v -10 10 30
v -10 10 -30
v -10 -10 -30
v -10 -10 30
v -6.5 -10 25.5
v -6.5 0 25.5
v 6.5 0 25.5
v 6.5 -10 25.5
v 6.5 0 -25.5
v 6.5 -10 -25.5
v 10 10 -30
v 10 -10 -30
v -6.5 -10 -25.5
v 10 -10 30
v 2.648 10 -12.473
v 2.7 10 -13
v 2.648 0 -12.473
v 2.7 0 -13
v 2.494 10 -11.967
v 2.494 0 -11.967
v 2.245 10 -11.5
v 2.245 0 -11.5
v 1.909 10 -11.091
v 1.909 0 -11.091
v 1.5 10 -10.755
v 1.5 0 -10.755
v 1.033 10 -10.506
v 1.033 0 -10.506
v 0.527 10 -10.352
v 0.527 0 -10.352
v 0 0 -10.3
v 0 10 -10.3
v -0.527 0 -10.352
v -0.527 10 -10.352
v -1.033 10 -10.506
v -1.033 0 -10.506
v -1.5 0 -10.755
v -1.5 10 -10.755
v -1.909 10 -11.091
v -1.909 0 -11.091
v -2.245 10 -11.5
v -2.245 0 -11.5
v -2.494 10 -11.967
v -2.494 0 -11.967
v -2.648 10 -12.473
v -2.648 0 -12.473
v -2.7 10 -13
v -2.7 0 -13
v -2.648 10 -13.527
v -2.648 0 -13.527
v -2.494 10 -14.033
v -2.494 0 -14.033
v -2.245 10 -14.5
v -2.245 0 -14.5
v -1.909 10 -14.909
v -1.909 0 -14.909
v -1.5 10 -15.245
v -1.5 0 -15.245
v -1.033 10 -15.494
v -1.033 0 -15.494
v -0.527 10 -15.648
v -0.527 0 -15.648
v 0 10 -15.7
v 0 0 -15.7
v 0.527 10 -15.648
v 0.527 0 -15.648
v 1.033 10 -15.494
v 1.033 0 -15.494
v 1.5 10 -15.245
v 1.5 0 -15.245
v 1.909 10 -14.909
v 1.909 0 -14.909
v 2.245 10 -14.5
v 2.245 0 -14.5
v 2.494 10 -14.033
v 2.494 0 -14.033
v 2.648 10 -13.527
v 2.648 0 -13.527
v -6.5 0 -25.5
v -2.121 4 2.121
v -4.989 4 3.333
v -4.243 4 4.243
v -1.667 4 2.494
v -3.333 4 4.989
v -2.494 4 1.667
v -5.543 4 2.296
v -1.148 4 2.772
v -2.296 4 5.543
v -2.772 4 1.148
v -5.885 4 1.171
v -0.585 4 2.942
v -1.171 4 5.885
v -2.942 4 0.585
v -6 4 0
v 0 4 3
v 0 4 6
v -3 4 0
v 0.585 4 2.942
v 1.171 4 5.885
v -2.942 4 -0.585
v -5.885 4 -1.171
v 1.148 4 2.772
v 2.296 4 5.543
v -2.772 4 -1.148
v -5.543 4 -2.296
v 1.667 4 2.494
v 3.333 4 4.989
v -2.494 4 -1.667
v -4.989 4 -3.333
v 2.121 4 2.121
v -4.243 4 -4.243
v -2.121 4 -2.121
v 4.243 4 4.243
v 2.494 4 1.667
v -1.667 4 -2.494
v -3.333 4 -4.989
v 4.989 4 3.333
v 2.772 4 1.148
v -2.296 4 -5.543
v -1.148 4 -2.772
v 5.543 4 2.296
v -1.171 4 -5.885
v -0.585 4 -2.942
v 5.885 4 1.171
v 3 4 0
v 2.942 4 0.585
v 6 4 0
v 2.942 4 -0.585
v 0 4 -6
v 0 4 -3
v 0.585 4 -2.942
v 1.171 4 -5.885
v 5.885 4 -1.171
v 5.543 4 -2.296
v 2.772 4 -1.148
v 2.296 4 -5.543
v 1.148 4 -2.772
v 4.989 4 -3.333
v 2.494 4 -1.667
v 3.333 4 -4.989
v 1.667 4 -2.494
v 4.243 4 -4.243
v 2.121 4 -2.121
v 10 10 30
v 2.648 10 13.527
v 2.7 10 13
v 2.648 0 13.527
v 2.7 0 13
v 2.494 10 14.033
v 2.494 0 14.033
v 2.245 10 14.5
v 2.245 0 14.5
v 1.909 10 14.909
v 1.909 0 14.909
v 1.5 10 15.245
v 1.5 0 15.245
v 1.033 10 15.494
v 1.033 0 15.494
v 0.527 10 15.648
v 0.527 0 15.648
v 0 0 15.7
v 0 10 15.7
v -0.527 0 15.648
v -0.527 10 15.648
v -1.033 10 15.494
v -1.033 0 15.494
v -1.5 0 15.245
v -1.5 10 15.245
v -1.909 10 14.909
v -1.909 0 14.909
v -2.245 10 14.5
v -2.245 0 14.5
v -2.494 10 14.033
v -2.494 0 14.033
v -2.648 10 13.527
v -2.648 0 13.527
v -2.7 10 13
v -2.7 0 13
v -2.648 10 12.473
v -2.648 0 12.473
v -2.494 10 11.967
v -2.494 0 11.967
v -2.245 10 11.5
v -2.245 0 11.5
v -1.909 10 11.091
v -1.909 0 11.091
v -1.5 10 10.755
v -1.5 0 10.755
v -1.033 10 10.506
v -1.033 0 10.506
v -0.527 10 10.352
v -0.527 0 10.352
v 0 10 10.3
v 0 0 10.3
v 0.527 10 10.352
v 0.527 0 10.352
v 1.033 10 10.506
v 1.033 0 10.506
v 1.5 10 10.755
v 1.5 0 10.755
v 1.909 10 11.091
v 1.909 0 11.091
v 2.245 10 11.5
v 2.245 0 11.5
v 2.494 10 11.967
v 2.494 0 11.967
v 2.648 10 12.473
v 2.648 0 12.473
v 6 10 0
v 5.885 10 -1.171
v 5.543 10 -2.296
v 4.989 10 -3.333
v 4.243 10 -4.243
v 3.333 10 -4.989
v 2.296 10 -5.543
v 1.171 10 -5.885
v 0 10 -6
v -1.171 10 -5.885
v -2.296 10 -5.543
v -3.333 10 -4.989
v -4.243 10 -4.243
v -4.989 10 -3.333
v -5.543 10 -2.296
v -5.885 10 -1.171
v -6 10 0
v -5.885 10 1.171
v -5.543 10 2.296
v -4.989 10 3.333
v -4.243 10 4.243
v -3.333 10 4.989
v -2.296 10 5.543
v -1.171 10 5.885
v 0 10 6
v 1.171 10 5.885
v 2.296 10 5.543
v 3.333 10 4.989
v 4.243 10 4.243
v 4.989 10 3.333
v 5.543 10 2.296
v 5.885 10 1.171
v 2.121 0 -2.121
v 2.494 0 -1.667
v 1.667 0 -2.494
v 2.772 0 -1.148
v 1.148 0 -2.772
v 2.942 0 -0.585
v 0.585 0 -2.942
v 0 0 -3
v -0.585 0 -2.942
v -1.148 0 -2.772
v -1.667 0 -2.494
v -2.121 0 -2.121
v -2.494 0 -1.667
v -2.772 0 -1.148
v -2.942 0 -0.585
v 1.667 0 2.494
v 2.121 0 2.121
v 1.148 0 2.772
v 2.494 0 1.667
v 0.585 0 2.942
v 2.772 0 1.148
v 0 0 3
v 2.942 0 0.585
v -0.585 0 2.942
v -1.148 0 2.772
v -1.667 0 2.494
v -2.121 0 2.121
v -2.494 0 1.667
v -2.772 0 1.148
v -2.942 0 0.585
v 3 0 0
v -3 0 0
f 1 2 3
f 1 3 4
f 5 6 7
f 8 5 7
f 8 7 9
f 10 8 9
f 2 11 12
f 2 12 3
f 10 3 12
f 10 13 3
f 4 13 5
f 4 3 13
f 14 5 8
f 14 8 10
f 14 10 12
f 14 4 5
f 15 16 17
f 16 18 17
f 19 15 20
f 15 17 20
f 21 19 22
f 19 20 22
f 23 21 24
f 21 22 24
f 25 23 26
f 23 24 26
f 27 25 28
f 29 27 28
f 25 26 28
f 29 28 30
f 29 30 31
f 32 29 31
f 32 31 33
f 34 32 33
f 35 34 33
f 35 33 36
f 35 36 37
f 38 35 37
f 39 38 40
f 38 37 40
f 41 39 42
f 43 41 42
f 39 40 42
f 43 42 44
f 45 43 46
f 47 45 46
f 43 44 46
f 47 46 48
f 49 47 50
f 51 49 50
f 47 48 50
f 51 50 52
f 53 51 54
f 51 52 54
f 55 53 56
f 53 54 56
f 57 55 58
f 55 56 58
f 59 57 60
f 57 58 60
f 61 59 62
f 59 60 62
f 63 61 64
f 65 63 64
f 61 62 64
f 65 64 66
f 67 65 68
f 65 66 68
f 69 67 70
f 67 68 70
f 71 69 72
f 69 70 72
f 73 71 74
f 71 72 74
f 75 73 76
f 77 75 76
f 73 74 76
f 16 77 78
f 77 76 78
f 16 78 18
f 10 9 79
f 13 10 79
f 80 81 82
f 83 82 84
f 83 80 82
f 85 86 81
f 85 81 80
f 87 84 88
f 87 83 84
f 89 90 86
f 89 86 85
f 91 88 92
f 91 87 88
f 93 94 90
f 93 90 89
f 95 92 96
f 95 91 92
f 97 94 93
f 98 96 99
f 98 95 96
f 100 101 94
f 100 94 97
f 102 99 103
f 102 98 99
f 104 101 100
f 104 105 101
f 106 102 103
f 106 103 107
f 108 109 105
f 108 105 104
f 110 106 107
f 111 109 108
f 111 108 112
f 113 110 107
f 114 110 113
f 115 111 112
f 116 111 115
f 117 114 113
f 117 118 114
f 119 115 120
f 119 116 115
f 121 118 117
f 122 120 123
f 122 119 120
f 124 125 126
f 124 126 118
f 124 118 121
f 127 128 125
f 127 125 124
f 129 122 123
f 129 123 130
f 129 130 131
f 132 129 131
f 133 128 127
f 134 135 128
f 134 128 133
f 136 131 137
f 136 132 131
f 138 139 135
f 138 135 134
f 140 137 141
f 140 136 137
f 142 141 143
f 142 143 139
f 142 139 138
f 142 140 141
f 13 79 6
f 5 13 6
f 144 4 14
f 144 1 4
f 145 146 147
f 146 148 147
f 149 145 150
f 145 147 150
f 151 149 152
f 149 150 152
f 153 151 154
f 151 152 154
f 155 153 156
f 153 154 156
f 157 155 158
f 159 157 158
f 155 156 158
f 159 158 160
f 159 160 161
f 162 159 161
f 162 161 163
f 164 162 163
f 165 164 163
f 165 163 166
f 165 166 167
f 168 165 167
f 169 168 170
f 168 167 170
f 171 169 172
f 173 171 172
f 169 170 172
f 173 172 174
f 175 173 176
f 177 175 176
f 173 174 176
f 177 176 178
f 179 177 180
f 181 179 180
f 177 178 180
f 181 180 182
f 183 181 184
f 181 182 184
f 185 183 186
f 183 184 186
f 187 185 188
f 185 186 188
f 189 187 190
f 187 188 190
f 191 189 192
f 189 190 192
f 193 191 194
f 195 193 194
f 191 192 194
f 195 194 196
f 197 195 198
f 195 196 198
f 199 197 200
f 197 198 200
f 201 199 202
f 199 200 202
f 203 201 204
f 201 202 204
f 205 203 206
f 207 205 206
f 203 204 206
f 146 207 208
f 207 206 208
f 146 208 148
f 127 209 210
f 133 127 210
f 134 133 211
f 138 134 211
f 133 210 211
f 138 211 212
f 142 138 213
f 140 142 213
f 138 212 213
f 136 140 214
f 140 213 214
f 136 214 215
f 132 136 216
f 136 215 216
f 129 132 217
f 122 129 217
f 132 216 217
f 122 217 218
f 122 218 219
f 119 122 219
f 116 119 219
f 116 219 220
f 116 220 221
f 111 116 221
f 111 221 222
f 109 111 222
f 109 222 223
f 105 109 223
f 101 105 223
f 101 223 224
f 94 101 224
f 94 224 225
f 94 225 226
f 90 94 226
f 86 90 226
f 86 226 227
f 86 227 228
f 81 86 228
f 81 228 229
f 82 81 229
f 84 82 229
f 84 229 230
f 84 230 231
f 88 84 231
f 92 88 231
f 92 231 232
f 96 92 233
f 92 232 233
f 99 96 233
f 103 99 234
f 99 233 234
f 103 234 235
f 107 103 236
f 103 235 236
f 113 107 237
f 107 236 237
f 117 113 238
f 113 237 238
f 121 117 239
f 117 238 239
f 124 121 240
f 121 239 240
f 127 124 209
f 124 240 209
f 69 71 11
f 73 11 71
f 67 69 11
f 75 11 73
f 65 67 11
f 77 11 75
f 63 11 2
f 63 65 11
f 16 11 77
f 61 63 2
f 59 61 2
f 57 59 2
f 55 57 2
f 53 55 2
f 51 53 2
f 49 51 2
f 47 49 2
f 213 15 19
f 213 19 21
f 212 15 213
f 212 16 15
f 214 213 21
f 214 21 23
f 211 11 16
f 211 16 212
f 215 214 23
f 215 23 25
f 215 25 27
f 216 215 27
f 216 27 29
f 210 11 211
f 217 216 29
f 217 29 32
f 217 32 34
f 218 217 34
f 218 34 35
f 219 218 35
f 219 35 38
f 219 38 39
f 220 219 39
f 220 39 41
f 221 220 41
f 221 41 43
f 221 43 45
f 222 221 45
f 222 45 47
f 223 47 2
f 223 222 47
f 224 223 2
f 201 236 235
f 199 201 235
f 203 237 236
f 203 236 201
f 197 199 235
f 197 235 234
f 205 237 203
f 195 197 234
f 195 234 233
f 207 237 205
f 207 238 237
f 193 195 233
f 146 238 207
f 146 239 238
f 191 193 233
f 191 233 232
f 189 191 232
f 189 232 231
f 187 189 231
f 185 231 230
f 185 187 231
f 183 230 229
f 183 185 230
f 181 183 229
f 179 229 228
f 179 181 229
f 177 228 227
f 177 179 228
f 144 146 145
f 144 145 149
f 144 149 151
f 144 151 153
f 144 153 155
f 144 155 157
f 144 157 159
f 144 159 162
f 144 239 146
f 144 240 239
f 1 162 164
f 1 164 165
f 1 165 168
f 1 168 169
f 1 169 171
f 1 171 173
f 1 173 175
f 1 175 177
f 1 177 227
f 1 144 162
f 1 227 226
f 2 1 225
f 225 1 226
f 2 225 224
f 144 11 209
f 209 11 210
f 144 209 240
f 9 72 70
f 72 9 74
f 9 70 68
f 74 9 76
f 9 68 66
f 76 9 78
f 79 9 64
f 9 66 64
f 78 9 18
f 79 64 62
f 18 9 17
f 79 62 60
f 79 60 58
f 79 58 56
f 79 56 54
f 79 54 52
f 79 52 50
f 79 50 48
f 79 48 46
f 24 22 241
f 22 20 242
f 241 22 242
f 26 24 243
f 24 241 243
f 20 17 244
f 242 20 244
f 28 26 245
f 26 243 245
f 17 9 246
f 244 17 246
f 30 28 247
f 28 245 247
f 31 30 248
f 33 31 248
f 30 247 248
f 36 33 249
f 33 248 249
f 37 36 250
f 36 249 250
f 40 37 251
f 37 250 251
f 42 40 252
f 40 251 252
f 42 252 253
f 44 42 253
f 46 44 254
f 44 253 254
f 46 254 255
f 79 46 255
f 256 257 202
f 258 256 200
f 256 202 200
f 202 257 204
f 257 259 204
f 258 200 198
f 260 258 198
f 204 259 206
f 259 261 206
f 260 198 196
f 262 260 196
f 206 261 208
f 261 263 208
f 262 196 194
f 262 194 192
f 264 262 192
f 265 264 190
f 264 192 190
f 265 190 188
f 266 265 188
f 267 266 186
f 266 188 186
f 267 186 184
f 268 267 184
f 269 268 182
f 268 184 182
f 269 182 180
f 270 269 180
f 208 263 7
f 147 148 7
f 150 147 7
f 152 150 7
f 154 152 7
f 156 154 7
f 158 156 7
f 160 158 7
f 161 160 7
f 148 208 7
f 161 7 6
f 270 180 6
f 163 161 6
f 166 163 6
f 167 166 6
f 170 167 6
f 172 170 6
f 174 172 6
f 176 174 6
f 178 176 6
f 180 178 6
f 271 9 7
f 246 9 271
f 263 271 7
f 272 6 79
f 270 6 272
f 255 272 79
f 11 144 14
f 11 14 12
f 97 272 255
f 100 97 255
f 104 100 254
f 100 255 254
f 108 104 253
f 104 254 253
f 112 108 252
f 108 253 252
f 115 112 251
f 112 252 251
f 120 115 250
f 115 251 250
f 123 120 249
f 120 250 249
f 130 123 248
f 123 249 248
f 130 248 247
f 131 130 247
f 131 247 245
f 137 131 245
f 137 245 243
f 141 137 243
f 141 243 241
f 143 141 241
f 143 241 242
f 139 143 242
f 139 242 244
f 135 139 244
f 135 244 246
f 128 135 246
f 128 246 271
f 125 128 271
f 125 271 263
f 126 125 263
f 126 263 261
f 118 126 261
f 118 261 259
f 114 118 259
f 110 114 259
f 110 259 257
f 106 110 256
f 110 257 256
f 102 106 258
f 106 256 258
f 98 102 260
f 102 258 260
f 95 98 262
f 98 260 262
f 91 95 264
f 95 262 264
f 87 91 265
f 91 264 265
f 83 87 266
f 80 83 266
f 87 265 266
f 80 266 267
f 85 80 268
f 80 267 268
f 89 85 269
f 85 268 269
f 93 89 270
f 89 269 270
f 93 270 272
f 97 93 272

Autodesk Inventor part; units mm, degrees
ref_plane "YZ Plane" through (0, 0, 0) normal (1, 0, 0) x (0, 1, 0)
ref_plane "XZ Plane" through (0, 0, 0) normal (0, 1, 0) x (-1, 0, 0)
ref_plane "XY Plane" through (0, 0, 0) normal (0, 0, 1) x (1, 0, 0)
sketch "Boceto1" plane through (0, 0, 0) normal (0, 1, 0) x (-1, 0, 0)
  line L0 (-10, 30) -> (10, 30)
  line L1 (10, 30) -> (10, -30)
  line L2 (10, -30) -> (-10, -30)
  line L3 (-10, -30) -> (-10, 30)
  line L4 (-10, 30) -> (10, -30) construction
  line L5 (10, 30) -> (-10, -30) construction
  circle A0 centre (0, 0) radius 3
  dimension "d0" = 6
  dimension "d1" = 60
  dimension "d2" = 20
extrude "Extrusión1" add sketch "Boceto1" along normal blind 10
sketch "Boceto2" plane through (0, 0, 0) normal (0, -1, 0) x (1, 0, 0)
  circle A0 centre (0, 13) radius 2.7
  circle A1 centre (0, -13) radius 2.7
  point P0 (0, 0)
  dimension "d5" = 5.4
  dimension "d6" = 13
  dimension "d7" = 13
extrude "Extrusión2" cut sketch "Boceto2" against normal through all
sketch "Boceto3" plane through (0, 0, 0) normal (0, -1, 0) x (1, 0, 0)
  line L0 (-6.5, 25.5) -> (6.5, 25.5)
  line L1 (6.5, 25.5) -> (6.5, -25.5)
  line L2 (6.5, -25.5) -> (-6.5, -25.5)
  line L3 (-6.5, -25.5) -> (-6.5, 25.5)
  circle A0 centre (0, 0) radius 3 projected
  line L4 (-6.5, 25.5) -> (6.5, -25.5) construction
  line L5 (6.5, 25.5) -> (-6.5, -25.5) construction
  circle A1 centre (0, -13) radius 2.7 projected
  circle A2 centre (0, 13) radius 2.7 projected
  line L6 (10, -30) -> (-10, -30) projected
  line L7 (10, 30) -> (10, -30) projected
  line L8 (-10, 30) -> (10, 30) projected
  line L9 (-10, -30) -> (-10, 30) projected
  circle A3 centre (0, 0) radius 3 projected
  dimension "d10" = 51
  dimension "d11" = 13
extrude "Extrusión3" add sketch "Boceto3" along normal blind 10 contours L6 L9 L8 L7
sketch "Boceto4" plane through (0, 10, 0) normal (0, 1, 0) x (1, 0, 0)
  circle A0 centre (0, 0) radius 6
  dimension "d14" = 12
extrude "Extrusión4" cut sketch "Boceto4" against normal blind 6
properties part number "LoadCellUpperPiece"
